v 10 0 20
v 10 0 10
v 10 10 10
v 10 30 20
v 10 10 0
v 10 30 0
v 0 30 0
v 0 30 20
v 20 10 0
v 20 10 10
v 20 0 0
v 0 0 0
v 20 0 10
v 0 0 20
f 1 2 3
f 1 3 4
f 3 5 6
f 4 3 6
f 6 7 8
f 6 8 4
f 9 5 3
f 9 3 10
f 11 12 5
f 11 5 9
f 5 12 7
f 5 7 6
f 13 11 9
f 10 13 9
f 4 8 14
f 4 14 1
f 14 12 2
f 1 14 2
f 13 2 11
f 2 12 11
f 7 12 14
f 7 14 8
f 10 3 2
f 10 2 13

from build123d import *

# Parameters (mm, degrees)
BOX001_W     = 10
BOX001_H     = 10
BOX001_DEPTH = 10
BOX_W        = 10
BOX_H        = 30
BOX_DEPTH    = 20


with BuildPart() as cub001:
    # Box001 → Box001 (new body)
    with BuildSketch(Plane(origin=(10, 0, 0), x_dir=(1, 0, 0), z_dir=(0, 0, 1))):
        with Locations((5, 5)):
            Rectangle(BOX001_W, BOX001_H)
    extrude(amount=BOX001_DEPTH)


with BuildPart() as fusion:
    # Box → Box (new body)
    with BuildSketch(Plane.XY):
        with Locations((5, 15)):
            Rectangle(BOX_W, BOX_H)
    extrude(amount=BOX_DEPTH)

    # Fusion: union Cub001
    add(cub001.part)


solid = fusion.part
